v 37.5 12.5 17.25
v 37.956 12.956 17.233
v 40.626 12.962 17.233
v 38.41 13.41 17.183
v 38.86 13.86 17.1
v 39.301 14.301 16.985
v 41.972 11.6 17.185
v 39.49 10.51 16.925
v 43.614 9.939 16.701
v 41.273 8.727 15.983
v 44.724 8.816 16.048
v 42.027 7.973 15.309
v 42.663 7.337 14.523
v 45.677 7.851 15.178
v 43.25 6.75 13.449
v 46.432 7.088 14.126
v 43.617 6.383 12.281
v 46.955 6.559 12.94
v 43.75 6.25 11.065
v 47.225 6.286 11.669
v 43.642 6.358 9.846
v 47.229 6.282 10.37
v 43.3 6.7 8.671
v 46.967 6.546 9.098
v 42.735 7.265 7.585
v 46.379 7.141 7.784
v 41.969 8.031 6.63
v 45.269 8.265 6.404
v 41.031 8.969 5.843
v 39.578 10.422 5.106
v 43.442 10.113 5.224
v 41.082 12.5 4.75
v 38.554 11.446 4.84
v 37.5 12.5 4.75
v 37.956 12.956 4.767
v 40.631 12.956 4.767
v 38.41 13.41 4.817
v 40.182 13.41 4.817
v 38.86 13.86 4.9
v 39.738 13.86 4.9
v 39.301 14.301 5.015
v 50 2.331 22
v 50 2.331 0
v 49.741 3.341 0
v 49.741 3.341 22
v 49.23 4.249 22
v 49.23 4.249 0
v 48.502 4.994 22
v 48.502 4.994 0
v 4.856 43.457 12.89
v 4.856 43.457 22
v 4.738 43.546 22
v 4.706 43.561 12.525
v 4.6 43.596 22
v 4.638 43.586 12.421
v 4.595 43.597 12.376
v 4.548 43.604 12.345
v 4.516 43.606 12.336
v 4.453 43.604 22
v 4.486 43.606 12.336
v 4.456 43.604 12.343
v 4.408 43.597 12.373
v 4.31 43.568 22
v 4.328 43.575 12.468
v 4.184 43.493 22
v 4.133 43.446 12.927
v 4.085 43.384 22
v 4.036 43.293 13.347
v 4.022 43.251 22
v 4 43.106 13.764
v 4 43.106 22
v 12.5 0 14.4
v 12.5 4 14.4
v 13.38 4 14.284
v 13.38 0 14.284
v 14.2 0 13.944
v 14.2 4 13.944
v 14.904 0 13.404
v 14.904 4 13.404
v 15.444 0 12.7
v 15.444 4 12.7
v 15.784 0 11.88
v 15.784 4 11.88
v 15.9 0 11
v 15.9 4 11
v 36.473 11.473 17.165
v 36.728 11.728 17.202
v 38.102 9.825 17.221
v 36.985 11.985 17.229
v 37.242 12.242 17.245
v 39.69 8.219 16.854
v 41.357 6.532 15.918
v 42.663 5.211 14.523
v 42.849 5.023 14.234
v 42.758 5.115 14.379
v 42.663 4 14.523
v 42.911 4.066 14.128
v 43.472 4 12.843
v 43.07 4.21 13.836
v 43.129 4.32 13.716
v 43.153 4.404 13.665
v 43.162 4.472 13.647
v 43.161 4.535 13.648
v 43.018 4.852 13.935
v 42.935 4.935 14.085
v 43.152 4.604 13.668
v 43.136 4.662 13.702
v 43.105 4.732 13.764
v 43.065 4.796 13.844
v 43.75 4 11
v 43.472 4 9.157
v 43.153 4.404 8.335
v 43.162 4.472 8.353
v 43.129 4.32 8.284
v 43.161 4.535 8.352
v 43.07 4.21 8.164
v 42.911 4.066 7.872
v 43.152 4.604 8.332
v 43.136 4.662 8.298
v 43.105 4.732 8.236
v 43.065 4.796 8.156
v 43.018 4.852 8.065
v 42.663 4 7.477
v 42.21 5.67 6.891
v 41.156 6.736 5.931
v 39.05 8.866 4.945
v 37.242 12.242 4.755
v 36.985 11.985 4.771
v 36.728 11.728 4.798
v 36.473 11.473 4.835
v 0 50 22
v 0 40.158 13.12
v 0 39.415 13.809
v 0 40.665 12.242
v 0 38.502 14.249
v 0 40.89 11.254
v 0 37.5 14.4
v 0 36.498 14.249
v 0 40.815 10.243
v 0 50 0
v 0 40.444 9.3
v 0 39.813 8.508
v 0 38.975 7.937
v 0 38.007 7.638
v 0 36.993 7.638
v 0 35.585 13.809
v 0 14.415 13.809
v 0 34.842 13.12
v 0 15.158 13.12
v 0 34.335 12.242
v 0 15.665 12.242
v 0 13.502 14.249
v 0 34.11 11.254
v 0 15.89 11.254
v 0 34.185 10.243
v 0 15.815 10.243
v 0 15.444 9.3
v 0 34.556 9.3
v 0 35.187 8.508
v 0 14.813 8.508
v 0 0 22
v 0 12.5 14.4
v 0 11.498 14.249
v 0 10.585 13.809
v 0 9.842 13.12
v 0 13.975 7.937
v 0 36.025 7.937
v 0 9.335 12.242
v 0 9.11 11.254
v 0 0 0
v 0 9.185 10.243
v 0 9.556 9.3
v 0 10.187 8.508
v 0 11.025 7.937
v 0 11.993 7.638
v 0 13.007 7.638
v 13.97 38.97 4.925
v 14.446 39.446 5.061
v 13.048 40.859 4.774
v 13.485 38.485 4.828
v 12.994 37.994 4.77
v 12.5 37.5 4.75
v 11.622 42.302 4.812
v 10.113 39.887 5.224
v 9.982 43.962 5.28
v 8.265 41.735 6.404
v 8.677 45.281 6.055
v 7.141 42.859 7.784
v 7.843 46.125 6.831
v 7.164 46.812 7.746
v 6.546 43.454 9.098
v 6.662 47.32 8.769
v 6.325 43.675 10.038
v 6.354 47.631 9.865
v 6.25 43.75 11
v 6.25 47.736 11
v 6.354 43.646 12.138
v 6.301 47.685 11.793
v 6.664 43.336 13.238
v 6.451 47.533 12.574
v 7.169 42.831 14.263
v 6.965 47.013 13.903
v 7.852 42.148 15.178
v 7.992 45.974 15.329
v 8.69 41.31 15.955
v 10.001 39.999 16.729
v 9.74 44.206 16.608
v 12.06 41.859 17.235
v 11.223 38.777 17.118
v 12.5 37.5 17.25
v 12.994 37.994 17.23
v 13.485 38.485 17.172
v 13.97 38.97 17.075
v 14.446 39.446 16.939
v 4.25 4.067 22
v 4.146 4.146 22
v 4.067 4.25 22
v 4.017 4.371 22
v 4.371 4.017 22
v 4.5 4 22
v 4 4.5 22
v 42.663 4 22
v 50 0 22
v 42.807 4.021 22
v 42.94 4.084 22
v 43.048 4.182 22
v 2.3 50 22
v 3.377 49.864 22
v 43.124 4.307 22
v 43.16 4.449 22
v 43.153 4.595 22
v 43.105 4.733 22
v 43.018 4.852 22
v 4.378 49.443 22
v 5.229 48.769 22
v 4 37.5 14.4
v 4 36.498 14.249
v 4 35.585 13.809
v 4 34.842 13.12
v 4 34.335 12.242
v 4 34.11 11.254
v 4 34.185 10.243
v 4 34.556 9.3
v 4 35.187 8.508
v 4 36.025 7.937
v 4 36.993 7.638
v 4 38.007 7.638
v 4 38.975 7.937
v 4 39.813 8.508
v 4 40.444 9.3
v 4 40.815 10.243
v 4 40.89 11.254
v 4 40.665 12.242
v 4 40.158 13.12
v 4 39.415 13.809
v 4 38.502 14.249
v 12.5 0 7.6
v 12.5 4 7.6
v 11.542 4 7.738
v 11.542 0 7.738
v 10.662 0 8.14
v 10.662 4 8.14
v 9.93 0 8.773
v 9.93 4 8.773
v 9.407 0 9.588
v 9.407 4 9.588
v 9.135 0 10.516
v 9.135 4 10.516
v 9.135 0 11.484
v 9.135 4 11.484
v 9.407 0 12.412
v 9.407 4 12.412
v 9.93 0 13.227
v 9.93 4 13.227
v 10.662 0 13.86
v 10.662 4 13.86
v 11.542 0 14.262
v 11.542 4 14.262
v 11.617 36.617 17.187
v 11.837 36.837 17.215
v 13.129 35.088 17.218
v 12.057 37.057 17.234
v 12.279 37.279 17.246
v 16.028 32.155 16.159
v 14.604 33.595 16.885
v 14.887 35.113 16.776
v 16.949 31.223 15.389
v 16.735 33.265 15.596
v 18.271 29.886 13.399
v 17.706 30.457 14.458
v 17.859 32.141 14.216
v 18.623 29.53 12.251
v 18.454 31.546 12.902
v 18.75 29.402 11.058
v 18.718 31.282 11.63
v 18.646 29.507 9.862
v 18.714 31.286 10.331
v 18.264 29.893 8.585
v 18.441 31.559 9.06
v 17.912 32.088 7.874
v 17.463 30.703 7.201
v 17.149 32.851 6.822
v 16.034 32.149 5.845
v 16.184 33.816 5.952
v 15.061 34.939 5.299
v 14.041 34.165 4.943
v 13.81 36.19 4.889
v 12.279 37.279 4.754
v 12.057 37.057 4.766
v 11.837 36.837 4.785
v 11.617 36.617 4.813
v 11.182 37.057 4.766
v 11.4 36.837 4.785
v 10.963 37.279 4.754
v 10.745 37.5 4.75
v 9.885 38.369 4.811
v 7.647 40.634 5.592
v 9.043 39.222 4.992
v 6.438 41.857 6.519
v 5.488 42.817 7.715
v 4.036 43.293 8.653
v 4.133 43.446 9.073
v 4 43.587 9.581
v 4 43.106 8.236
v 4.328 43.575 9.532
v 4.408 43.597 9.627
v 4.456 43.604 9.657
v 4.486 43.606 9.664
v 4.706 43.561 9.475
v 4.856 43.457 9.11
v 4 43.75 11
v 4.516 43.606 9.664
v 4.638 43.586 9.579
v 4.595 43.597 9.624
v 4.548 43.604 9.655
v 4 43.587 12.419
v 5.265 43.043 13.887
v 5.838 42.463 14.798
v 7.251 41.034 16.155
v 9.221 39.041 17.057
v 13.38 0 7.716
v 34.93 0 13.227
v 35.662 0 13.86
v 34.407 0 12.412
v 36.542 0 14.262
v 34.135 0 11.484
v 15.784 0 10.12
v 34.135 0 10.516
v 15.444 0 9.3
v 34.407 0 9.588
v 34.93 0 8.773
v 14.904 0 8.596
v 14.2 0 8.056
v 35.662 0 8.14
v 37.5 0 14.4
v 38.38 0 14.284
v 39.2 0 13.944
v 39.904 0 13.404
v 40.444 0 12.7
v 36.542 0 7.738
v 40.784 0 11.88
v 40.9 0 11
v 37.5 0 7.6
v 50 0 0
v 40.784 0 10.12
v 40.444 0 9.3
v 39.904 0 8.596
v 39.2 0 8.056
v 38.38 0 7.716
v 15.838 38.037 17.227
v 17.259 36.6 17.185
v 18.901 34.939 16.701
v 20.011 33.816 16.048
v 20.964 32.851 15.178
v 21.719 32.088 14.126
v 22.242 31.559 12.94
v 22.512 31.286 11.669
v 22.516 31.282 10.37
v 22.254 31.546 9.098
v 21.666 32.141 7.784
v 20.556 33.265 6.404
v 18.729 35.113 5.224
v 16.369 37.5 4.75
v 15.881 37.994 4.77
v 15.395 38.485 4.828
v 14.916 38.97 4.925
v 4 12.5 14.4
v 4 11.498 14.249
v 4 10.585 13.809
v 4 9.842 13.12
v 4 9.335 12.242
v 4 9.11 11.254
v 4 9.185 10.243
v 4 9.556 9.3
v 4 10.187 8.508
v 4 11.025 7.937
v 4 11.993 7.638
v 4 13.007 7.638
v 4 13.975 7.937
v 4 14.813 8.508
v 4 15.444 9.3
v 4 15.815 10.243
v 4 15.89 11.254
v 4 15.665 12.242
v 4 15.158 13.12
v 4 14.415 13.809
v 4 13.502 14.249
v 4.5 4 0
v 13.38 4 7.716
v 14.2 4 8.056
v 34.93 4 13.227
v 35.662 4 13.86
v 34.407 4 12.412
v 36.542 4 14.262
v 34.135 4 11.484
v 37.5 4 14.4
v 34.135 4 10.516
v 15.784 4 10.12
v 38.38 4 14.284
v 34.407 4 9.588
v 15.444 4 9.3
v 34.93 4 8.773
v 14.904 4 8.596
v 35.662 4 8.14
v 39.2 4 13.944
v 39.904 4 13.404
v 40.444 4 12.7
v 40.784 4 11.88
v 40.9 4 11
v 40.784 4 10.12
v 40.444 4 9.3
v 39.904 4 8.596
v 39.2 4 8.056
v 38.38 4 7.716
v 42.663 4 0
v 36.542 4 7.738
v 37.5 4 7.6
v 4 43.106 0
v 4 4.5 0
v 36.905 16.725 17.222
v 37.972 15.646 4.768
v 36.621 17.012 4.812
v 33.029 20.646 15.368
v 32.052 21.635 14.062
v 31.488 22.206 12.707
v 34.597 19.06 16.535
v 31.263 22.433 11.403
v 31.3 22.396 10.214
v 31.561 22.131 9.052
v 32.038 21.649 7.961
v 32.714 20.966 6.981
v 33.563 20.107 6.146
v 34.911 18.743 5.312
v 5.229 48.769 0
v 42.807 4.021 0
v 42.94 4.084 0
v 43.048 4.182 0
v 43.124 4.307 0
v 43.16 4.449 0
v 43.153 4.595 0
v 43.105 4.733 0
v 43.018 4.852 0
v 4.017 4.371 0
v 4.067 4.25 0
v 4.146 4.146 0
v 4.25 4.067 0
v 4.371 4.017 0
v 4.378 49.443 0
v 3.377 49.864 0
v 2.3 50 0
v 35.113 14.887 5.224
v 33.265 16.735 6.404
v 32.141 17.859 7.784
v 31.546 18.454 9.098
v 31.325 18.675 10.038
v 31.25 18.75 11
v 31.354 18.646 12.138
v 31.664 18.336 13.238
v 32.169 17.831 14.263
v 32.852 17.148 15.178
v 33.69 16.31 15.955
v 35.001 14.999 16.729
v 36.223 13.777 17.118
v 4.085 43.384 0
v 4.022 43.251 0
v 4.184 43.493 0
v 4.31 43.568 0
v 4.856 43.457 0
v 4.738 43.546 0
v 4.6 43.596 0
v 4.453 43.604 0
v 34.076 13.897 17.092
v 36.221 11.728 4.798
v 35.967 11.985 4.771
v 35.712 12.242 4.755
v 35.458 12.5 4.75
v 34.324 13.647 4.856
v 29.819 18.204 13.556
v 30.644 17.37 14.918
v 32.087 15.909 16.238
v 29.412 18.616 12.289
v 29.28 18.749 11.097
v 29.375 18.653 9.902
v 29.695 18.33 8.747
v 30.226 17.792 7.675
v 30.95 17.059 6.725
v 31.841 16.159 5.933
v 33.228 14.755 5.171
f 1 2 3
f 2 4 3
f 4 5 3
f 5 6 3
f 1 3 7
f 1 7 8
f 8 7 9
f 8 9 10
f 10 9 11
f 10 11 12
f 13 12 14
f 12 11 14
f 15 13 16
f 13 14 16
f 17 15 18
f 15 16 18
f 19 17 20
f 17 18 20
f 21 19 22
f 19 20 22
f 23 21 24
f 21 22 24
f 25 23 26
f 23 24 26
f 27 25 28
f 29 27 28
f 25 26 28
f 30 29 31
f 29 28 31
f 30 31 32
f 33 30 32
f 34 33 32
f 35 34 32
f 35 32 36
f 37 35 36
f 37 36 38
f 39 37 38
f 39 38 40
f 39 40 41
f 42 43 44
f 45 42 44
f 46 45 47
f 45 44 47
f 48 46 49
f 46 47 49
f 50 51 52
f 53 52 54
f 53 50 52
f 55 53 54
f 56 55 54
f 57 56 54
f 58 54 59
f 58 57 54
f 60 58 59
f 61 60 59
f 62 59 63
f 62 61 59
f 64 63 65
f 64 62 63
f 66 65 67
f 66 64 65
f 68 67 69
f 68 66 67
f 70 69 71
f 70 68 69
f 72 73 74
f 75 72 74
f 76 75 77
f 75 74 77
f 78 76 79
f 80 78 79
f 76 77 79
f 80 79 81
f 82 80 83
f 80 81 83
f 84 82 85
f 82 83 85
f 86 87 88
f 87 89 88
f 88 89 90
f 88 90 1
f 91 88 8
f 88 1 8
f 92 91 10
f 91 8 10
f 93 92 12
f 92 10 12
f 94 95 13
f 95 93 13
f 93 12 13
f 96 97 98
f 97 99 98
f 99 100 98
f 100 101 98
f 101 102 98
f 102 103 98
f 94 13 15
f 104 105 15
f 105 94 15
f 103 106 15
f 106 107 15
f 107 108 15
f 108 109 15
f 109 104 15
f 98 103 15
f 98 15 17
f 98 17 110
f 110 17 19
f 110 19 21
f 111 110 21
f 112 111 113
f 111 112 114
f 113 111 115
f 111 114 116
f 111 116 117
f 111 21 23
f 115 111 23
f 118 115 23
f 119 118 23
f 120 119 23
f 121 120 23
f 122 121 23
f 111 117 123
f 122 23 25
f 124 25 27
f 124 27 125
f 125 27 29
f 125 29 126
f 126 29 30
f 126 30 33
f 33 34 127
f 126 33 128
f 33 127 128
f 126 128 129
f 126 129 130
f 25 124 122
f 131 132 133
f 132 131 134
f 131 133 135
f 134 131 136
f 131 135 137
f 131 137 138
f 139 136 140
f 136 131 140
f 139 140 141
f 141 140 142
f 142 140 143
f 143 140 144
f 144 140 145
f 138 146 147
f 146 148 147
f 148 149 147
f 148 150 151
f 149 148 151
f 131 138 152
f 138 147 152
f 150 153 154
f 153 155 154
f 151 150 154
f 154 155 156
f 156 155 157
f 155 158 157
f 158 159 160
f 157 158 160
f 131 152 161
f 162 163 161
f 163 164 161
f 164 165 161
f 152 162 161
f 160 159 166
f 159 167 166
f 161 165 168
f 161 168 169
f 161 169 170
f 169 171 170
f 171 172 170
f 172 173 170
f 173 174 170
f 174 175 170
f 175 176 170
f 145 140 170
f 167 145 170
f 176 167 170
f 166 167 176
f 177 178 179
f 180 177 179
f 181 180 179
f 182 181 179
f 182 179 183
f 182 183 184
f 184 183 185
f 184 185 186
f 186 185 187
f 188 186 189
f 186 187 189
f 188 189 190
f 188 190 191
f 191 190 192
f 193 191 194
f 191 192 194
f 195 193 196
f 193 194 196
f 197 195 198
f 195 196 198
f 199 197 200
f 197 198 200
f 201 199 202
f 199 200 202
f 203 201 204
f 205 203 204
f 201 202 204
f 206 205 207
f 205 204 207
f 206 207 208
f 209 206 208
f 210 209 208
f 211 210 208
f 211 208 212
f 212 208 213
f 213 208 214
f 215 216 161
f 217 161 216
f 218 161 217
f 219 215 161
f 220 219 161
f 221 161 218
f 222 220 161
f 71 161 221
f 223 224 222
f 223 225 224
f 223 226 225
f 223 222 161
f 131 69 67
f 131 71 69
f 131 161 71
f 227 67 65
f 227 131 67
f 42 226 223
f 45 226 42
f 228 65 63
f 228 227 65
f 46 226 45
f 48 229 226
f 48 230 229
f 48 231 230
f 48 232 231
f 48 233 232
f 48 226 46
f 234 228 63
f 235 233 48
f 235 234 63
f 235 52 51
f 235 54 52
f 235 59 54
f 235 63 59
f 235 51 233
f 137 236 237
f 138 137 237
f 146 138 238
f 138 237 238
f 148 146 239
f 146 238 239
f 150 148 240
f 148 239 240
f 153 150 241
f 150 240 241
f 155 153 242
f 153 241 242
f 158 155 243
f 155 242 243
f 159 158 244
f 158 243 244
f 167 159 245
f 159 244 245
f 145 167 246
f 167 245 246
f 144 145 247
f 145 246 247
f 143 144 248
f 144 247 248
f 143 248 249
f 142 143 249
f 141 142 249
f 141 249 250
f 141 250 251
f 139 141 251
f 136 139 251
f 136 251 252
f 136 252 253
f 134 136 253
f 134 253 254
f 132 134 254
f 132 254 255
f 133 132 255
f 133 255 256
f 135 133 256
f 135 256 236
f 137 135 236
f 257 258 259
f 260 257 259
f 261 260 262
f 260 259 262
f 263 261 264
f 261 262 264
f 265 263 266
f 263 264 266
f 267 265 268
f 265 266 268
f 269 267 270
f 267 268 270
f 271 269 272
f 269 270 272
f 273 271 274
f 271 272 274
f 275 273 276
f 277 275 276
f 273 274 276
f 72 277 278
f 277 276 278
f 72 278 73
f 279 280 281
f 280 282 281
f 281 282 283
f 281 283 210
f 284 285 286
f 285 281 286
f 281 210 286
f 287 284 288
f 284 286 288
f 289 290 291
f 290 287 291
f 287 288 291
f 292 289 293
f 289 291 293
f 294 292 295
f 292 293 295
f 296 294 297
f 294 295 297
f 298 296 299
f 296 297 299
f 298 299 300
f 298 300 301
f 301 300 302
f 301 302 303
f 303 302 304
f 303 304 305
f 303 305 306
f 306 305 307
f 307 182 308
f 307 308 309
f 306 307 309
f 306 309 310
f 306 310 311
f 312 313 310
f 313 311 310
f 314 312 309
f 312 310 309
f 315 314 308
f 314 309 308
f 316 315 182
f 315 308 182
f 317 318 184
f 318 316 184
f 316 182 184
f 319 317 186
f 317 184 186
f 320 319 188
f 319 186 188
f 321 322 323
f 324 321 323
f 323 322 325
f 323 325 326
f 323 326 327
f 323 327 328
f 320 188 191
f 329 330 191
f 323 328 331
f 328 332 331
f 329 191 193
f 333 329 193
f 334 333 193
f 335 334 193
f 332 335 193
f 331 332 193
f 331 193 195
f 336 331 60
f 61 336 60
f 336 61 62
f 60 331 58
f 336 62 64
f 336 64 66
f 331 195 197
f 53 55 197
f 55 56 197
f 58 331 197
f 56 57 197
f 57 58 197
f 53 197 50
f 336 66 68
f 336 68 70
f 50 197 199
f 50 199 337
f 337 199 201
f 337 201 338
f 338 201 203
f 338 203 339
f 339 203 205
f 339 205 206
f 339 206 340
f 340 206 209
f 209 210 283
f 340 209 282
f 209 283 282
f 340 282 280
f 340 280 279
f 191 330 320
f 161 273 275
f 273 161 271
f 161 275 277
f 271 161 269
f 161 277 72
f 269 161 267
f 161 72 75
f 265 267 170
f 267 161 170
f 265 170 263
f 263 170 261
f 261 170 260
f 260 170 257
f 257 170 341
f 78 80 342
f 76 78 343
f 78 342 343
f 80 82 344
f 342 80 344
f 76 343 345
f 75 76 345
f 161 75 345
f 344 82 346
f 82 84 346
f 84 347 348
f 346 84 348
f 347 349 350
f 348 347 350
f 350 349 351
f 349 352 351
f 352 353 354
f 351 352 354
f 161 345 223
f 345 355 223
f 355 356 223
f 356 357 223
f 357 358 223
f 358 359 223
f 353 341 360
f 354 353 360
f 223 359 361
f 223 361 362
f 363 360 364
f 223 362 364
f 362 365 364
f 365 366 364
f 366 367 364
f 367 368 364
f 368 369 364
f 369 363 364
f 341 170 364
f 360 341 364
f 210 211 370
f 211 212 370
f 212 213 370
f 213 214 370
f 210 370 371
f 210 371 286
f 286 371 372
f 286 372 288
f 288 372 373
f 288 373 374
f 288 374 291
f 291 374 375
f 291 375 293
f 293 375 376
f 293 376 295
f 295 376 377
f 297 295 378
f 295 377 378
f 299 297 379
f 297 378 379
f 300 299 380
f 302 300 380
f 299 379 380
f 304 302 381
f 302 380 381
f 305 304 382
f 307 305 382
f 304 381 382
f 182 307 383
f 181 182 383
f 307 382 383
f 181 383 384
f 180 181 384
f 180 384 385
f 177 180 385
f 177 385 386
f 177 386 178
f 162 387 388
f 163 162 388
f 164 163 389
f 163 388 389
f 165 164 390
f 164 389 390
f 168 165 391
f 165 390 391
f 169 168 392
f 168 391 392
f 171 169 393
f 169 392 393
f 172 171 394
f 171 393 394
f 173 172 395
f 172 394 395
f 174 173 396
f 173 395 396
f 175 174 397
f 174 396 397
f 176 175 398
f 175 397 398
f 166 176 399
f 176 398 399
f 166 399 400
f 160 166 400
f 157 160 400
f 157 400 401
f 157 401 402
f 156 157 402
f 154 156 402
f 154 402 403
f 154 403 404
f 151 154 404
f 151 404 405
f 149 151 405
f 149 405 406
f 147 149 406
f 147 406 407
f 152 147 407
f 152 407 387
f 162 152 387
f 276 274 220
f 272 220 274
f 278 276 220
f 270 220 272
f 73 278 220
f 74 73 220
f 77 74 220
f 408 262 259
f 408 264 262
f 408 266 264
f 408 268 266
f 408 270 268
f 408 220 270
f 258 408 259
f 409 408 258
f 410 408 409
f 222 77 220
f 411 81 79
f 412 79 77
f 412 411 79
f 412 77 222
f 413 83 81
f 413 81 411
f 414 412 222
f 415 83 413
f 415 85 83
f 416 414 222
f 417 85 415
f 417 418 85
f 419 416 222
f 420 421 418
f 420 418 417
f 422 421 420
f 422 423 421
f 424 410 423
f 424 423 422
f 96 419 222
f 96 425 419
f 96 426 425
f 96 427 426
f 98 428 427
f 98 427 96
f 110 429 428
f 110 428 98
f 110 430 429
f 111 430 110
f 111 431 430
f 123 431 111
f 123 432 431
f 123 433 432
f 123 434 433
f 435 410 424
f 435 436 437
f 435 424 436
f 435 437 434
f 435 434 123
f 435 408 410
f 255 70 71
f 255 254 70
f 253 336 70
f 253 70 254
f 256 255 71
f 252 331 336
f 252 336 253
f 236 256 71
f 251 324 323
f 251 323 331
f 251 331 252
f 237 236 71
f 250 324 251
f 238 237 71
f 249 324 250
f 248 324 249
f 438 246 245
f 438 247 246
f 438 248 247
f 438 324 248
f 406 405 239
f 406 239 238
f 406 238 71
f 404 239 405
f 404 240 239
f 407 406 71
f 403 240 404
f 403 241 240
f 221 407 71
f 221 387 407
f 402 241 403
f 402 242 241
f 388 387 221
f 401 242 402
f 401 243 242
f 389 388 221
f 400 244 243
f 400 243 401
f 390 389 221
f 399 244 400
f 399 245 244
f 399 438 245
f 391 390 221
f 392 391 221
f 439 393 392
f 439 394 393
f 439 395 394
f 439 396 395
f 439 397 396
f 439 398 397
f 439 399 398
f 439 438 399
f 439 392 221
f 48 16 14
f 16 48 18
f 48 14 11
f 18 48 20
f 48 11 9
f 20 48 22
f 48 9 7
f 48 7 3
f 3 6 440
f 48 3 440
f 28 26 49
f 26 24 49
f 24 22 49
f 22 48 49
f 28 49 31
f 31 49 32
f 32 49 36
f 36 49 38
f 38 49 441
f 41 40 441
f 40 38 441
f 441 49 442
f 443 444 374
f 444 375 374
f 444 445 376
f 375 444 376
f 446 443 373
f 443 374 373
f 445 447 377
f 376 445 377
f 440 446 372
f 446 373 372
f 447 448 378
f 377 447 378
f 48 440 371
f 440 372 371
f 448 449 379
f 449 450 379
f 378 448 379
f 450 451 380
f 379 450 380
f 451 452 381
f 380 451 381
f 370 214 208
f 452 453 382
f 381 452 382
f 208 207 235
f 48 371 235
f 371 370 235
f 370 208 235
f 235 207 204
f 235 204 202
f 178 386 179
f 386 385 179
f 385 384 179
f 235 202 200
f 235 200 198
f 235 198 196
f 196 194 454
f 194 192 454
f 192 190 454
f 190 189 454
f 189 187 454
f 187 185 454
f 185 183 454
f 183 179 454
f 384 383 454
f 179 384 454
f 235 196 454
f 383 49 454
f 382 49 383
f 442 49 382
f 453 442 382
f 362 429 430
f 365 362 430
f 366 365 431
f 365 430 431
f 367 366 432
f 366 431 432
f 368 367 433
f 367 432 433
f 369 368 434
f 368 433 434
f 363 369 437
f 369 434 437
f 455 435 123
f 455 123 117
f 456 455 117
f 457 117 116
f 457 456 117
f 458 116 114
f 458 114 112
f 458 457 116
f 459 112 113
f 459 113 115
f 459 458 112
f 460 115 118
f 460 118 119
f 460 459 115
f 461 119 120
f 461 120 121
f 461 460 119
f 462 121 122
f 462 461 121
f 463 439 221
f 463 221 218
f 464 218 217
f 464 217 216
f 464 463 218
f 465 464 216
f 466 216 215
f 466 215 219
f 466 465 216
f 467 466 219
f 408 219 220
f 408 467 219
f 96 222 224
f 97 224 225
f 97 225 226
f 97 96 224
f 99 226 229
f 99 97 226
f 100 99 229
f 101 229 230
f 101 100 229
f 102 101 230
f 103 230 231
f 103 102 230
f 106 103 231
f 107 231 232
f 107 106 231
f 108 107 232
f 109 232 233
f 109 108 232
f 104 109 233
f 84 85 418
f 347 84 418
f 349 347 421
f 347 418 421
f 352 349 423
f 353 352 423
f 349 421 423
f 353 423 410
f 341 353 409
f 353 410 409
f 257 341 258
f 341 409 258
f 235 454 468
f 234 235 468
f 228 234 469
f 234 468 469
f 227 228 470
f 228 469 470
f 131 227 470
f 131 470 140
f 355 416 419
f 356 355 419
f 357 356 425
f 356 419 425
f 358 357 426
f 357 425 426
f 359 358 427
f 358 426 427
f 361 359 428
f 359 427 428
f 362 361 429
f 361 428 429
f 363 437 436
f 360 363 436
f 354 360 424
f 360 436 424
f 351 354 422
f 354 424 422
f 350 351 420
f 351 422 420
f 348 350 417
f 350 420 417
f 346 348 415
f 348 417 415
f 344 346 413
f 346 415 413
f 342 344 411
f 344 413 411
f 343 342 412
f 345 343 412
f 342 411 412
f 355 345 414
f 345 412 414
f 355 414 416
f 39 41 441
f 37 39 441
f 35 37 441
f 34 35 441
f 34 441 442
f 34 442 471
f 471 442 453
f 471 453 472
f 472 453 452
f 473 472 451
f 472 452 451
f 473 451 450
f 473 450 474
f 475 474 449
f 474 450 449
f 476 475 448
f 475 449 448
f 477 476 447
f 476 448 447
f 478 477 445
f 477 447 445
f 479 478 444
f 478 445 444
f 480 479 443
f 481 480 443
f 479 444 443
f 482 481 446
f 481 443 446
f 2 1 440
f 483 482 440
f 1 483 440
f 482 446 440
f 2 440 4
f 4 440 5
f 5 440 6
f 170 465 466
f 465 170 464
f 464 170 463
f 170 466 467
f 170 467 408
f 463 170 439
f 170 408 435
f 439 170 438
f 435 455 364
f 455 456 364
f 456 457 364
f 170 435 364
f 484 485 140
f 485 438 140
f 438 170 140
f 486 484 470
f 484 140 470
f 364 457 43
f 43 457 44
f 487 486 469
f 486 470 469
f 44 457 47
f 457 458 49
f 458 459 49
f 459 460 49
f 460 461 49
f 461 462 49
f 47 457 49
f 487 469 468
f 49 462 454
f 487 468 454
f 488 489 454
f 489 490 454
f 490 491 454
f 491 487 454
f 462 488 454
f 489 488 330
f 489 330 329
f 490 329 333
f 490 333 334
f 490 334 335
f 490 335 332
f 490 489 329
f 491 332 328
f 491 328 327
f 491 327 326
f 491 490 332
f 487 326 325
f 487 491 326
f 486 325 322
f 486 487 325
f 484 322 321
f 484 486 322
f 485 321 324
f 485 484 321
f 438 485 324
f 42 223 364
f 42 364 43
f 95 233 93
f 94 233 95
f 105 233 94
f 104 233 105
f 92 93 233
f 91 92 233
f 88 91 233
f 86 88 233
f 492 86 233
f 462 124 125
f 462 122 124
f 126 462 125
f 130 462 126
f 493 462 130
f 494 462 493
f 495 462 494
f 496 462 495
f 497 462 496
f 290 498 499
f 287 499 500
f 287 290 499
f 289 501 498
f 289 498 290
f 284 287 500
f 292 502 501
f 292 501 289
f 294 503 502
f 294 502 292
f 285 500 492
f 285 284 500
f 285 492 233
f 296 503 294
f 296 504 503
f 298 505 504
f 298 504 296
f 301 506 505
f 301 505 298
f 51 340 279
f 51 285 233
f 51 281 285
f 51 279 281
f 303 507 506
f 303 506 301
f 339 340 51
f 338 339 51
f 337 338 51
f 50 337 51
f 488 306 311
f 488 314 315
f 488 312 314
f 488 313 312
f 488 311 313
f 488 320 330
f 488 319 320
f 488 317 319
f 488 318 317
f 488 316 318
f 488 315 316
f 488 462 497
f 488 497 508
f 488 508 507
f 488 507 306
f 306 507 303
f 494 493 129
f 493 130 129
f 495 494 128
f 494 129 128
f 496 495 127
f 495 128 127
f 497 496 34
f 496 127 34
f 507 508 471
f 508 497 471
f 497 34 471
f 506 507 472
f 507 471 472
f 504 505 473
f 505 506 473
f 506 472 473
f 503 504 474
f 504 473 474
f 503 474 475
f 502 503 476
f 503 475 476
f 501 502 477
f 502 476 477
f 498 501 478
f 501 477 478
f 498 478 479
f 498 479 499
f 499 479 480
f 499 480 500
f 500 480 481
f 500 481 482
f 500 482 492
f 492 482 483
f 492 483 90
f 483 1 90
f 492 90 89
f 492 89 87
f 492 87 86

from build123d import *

# Parameters (mm, degrees)
EXTRUDE1_DEPTH     = 22
CUT_EXTRUDE1_DEPTH = 75.054034
CUT_EXTRUDE2_REACH = 76.054
SKETCH5_R          = 6.25
CUT_EXTRUDE3_DEPTH = 75.054186
CUT_EXTRUDE4_REACH = 76.054
SKETCH7_R          = 6.25


with BuildPart() as part:
    # Sketch1 → Extrude1 (new body)
    with BuildSketch(Plane.XY):
        with BuildLine():
            Line((0, 0), (50, 0))
            Line((50, 0), (50, 2.331245))
            ThreePointArc((50, 2.331245), (49.515156, 3.811364), (48.501771, 4.994104))
            Line((48.501771, 4.994104), (5.229403, 48.768941))
            ThreePointArc((5.229403, 48.768941), (3.892255, 49.687806), (2.300146, 50))
            Line((2.300146, 50), (0, 50))
            Line((0, 50), (0, 0))
        make_face()
        with BuildLine():
            Line((4, 43.105797), (4, 4.5))
            ThreePointArc((4, 4.5), (4.146447, 4.146447), (4.5, 4))
            Line((4.5, 4), (42.662662, 4))
            ThreePointArc((42.662662, 4), (43.124047, 4.307326), (43.01825, 4.851507))
            Line((43.01825, 4.851507), (4.855588, 43.457304))
            ThreePointArc((4.855588, 43.457304), (4.309992, 43.568287), (4, 43.105797))
        make_face(mode=Mode.SUBTRACT)
    extrude(amount=EXTRUDE1_DEPTH)

    # Sketch4 → Cut-Extrude1 (cut, through all)
    with BuildSketch(Plane(origin=(0, 50, 0), x_dir=(1, 0, 0), z_dir=(0, 1, 0))):
        with BuildLine():
            ThreePointArc((12.5, -7.6), (9.1, -11), (12.5, -14.4))
            Line((12.5, -14.4), (12.5, -7.6))
        make_face()
        with BuildLine():
            Line((12.5, -7.6), (12.5, -14.4))
            ThreePointArc((12.5, -14.4), (14.904163, -13.404163), (15.9, -11))
            ThreePointArc((15.9, -11), (14.904163, -8.595837), (12.5, -7.6))
        make_face()
        with BuildLine():
            ThreePointArc((37.5, -7.6), (34.1, -11), (37.5, -14.4))
            Line((37.5, -14.4), (37.5, -7.6))
        make_face()
        with BuildLine():
            Line((37.5, -7.6), (37.5, -14.4))
            ThreePointArc((37.5, -14.4), (39.904163, -13.404163), (40.9, -11))
            ThreePointArc((40.9, -11), (39.904163, -8.595837), (37.5, -7.6))
        make_face()
    extrude(amount=-CUT_EXTRUDE1_DEPTH, mode=Mode.SUBTRACT)

    # Cut-Extrude2: up to this face of the body (flat: up to its plane)
    cut_extrude2_end = Plane(part.part.faces().sort_by_distance((23.446976, 4, 11))[0])
    # Sketch5 → Cut-Extrude2 (cut, up to the picked face)
    with BuildSketch(Plane(origin=(0, 50, 0), x_dir=(1, 0, 0), z_dir=(0, 1, 0)), mode=Mode.PRIVATE) as cut_extrude2_sk1:
        with Locations(Location((12.5, -11, 0), (0, 0, 180))):
            Circle(SKETCH5_R)
    cut_extrude2_tool1 = split(extrude(cut_extrude2_sk1.sketch, amount=-CUT_EXTRUDE2_REACH, mode=Mode.PRIVATE), bisect_by=cut_extrude2_end, keep=Keep.BOTH, mode=Mode.PRIVATE)
    # Sketch5 → Cut-Extrude2 (cut, up to the picked face)
    with BuildSketch(Plane(origin=(0, 50, 0), x_dir=(1, 0, 0), z_dir=(0, 1, 0)), mode=Mode.PRIVATE) as cut_extrude2_sk2:
        with Locations(Location((37.5, -11, 0), (0, 0, 325.692636))):
            Circle(SKETCH5_R)
    cut_extrude2_tool2 = split(extrude(cut_extrude2_sk2.sketch, amount=-CUT_EXTRUDE2_REACH, mode=Mode.PRIVATE), bisect_by=cut_extrude2_end, keep=Keep.BOTH, mode=Mode.PRIVATE)
    add(cut_extrude2_tool1.solids().sort_by(Axis((12.5, 50, 11), (0, -1, 0)))[0], mode=Mode.SUBTRACT)
    add(cut_extrude2_tool2.solids().sort_by(Axis((37.5, 50, 11), (0, -1, 0)))[0], mode=Mode.SUBTRACT)

    # Sketch6 → Cut-Extrude3 (cut, through all)
    with BuildSketch(Plane(origin=(50, 0, 0), x_dir=(0, 0, -1), z_dir=(1, 0, 0))):
        with BuildLine():
            ThreePointArc((-7.6, 37.5), (-11, 40.9), (-14.4, 37.5))
            Line((-14.4, 37.5), (-7.6, 37.5))
        make_face()
        with BuildLine():
            Line((-7.6, 37.5), (-14.4, 37.5))
            ThreePointArc((-14.4, 37.5), (-11, 34.1), (-7.6, 37.5))
        make_face()
        with BuildLine():
            ThreePointArc((-7.6, 12.5), (-11, 15.9), (-14.4, 12.5))
            Line((-14.4, 12.5), (-7.6, 12.5))
        make_face()
        with BuildLine():
            Line((-7.6, 12.5), (-14.4, 12.5))
            ThreePointArc((-14.4, 12.5), (-11, 9.1), (-7.6, 12.5))
        make_face()
    extrude(amount=-CUT_EXTRUDE3_DEPTH, mode=Mode.SUBTRACT)

    # Cut-Extrude4: up to this face of the body (flat: up to its plane)
    cut_extrude4_end = Plane(part.part.faces().sort_by_distance((4, 23.69095, 11))[0])
    # Sketch7 → Cut-Extrude4 (cut, up to the picked face)
    with BuildSketch(Plane(origin=(50, 0, 0), x_dir=(0, 0, -1), z_dir=(1, 0, 0)), mode=Mode.PRIVATE) as cut_extrude4_sk1:
        with Locations((-11, 12.5)):
            Circle(SKETCH7_R)
    cut_extrude4_tool1 = split(extrude(cut_extrude4_sk1.sketch, amount=-CUT_EXTRUDE4_REACH, mode=Mode.PRIVATE), bisect_by=cut_extrude4_end, keep=Keep.BOTH, mode=Mode.PRIVATE)
    # Sketch7 → Cut-Extrude4 (cut, up to the picked face)
    with BuildSketch(Plane(origin=(50, 0, 0), x_dir=(0, 0, -1), z_dir=(1, 0, 0)), mode=Mode.PRIVATE) as cut_extrude4_sk2:
        with Locations((-11, 37.5)):
            Circle(SKETCH7_R)
    cut_extrude4_tool2 = split(extrude(cut_extrude4_sk2.sketch, amount=-CUT_EXTRUDE4_REACH, mode=Mode.PRIVATE), bisect_by=cut_extrude4_end, keep=Keep.BOTH, mode=Mode.PRIVATE)
    add(cut_extrude4_tool1.solids().sort_by(Axis((50, 12.5, 11), (-1, 0, 0)))[0], mode=Mode.SUBTRACT)
    add(cut_extrude4_tool2.solids().sort_by(Axis((50, 37.5, 11), (-1, 0, 0)))[0], mode=Mode.SUBTRACT)


solid = part.part
